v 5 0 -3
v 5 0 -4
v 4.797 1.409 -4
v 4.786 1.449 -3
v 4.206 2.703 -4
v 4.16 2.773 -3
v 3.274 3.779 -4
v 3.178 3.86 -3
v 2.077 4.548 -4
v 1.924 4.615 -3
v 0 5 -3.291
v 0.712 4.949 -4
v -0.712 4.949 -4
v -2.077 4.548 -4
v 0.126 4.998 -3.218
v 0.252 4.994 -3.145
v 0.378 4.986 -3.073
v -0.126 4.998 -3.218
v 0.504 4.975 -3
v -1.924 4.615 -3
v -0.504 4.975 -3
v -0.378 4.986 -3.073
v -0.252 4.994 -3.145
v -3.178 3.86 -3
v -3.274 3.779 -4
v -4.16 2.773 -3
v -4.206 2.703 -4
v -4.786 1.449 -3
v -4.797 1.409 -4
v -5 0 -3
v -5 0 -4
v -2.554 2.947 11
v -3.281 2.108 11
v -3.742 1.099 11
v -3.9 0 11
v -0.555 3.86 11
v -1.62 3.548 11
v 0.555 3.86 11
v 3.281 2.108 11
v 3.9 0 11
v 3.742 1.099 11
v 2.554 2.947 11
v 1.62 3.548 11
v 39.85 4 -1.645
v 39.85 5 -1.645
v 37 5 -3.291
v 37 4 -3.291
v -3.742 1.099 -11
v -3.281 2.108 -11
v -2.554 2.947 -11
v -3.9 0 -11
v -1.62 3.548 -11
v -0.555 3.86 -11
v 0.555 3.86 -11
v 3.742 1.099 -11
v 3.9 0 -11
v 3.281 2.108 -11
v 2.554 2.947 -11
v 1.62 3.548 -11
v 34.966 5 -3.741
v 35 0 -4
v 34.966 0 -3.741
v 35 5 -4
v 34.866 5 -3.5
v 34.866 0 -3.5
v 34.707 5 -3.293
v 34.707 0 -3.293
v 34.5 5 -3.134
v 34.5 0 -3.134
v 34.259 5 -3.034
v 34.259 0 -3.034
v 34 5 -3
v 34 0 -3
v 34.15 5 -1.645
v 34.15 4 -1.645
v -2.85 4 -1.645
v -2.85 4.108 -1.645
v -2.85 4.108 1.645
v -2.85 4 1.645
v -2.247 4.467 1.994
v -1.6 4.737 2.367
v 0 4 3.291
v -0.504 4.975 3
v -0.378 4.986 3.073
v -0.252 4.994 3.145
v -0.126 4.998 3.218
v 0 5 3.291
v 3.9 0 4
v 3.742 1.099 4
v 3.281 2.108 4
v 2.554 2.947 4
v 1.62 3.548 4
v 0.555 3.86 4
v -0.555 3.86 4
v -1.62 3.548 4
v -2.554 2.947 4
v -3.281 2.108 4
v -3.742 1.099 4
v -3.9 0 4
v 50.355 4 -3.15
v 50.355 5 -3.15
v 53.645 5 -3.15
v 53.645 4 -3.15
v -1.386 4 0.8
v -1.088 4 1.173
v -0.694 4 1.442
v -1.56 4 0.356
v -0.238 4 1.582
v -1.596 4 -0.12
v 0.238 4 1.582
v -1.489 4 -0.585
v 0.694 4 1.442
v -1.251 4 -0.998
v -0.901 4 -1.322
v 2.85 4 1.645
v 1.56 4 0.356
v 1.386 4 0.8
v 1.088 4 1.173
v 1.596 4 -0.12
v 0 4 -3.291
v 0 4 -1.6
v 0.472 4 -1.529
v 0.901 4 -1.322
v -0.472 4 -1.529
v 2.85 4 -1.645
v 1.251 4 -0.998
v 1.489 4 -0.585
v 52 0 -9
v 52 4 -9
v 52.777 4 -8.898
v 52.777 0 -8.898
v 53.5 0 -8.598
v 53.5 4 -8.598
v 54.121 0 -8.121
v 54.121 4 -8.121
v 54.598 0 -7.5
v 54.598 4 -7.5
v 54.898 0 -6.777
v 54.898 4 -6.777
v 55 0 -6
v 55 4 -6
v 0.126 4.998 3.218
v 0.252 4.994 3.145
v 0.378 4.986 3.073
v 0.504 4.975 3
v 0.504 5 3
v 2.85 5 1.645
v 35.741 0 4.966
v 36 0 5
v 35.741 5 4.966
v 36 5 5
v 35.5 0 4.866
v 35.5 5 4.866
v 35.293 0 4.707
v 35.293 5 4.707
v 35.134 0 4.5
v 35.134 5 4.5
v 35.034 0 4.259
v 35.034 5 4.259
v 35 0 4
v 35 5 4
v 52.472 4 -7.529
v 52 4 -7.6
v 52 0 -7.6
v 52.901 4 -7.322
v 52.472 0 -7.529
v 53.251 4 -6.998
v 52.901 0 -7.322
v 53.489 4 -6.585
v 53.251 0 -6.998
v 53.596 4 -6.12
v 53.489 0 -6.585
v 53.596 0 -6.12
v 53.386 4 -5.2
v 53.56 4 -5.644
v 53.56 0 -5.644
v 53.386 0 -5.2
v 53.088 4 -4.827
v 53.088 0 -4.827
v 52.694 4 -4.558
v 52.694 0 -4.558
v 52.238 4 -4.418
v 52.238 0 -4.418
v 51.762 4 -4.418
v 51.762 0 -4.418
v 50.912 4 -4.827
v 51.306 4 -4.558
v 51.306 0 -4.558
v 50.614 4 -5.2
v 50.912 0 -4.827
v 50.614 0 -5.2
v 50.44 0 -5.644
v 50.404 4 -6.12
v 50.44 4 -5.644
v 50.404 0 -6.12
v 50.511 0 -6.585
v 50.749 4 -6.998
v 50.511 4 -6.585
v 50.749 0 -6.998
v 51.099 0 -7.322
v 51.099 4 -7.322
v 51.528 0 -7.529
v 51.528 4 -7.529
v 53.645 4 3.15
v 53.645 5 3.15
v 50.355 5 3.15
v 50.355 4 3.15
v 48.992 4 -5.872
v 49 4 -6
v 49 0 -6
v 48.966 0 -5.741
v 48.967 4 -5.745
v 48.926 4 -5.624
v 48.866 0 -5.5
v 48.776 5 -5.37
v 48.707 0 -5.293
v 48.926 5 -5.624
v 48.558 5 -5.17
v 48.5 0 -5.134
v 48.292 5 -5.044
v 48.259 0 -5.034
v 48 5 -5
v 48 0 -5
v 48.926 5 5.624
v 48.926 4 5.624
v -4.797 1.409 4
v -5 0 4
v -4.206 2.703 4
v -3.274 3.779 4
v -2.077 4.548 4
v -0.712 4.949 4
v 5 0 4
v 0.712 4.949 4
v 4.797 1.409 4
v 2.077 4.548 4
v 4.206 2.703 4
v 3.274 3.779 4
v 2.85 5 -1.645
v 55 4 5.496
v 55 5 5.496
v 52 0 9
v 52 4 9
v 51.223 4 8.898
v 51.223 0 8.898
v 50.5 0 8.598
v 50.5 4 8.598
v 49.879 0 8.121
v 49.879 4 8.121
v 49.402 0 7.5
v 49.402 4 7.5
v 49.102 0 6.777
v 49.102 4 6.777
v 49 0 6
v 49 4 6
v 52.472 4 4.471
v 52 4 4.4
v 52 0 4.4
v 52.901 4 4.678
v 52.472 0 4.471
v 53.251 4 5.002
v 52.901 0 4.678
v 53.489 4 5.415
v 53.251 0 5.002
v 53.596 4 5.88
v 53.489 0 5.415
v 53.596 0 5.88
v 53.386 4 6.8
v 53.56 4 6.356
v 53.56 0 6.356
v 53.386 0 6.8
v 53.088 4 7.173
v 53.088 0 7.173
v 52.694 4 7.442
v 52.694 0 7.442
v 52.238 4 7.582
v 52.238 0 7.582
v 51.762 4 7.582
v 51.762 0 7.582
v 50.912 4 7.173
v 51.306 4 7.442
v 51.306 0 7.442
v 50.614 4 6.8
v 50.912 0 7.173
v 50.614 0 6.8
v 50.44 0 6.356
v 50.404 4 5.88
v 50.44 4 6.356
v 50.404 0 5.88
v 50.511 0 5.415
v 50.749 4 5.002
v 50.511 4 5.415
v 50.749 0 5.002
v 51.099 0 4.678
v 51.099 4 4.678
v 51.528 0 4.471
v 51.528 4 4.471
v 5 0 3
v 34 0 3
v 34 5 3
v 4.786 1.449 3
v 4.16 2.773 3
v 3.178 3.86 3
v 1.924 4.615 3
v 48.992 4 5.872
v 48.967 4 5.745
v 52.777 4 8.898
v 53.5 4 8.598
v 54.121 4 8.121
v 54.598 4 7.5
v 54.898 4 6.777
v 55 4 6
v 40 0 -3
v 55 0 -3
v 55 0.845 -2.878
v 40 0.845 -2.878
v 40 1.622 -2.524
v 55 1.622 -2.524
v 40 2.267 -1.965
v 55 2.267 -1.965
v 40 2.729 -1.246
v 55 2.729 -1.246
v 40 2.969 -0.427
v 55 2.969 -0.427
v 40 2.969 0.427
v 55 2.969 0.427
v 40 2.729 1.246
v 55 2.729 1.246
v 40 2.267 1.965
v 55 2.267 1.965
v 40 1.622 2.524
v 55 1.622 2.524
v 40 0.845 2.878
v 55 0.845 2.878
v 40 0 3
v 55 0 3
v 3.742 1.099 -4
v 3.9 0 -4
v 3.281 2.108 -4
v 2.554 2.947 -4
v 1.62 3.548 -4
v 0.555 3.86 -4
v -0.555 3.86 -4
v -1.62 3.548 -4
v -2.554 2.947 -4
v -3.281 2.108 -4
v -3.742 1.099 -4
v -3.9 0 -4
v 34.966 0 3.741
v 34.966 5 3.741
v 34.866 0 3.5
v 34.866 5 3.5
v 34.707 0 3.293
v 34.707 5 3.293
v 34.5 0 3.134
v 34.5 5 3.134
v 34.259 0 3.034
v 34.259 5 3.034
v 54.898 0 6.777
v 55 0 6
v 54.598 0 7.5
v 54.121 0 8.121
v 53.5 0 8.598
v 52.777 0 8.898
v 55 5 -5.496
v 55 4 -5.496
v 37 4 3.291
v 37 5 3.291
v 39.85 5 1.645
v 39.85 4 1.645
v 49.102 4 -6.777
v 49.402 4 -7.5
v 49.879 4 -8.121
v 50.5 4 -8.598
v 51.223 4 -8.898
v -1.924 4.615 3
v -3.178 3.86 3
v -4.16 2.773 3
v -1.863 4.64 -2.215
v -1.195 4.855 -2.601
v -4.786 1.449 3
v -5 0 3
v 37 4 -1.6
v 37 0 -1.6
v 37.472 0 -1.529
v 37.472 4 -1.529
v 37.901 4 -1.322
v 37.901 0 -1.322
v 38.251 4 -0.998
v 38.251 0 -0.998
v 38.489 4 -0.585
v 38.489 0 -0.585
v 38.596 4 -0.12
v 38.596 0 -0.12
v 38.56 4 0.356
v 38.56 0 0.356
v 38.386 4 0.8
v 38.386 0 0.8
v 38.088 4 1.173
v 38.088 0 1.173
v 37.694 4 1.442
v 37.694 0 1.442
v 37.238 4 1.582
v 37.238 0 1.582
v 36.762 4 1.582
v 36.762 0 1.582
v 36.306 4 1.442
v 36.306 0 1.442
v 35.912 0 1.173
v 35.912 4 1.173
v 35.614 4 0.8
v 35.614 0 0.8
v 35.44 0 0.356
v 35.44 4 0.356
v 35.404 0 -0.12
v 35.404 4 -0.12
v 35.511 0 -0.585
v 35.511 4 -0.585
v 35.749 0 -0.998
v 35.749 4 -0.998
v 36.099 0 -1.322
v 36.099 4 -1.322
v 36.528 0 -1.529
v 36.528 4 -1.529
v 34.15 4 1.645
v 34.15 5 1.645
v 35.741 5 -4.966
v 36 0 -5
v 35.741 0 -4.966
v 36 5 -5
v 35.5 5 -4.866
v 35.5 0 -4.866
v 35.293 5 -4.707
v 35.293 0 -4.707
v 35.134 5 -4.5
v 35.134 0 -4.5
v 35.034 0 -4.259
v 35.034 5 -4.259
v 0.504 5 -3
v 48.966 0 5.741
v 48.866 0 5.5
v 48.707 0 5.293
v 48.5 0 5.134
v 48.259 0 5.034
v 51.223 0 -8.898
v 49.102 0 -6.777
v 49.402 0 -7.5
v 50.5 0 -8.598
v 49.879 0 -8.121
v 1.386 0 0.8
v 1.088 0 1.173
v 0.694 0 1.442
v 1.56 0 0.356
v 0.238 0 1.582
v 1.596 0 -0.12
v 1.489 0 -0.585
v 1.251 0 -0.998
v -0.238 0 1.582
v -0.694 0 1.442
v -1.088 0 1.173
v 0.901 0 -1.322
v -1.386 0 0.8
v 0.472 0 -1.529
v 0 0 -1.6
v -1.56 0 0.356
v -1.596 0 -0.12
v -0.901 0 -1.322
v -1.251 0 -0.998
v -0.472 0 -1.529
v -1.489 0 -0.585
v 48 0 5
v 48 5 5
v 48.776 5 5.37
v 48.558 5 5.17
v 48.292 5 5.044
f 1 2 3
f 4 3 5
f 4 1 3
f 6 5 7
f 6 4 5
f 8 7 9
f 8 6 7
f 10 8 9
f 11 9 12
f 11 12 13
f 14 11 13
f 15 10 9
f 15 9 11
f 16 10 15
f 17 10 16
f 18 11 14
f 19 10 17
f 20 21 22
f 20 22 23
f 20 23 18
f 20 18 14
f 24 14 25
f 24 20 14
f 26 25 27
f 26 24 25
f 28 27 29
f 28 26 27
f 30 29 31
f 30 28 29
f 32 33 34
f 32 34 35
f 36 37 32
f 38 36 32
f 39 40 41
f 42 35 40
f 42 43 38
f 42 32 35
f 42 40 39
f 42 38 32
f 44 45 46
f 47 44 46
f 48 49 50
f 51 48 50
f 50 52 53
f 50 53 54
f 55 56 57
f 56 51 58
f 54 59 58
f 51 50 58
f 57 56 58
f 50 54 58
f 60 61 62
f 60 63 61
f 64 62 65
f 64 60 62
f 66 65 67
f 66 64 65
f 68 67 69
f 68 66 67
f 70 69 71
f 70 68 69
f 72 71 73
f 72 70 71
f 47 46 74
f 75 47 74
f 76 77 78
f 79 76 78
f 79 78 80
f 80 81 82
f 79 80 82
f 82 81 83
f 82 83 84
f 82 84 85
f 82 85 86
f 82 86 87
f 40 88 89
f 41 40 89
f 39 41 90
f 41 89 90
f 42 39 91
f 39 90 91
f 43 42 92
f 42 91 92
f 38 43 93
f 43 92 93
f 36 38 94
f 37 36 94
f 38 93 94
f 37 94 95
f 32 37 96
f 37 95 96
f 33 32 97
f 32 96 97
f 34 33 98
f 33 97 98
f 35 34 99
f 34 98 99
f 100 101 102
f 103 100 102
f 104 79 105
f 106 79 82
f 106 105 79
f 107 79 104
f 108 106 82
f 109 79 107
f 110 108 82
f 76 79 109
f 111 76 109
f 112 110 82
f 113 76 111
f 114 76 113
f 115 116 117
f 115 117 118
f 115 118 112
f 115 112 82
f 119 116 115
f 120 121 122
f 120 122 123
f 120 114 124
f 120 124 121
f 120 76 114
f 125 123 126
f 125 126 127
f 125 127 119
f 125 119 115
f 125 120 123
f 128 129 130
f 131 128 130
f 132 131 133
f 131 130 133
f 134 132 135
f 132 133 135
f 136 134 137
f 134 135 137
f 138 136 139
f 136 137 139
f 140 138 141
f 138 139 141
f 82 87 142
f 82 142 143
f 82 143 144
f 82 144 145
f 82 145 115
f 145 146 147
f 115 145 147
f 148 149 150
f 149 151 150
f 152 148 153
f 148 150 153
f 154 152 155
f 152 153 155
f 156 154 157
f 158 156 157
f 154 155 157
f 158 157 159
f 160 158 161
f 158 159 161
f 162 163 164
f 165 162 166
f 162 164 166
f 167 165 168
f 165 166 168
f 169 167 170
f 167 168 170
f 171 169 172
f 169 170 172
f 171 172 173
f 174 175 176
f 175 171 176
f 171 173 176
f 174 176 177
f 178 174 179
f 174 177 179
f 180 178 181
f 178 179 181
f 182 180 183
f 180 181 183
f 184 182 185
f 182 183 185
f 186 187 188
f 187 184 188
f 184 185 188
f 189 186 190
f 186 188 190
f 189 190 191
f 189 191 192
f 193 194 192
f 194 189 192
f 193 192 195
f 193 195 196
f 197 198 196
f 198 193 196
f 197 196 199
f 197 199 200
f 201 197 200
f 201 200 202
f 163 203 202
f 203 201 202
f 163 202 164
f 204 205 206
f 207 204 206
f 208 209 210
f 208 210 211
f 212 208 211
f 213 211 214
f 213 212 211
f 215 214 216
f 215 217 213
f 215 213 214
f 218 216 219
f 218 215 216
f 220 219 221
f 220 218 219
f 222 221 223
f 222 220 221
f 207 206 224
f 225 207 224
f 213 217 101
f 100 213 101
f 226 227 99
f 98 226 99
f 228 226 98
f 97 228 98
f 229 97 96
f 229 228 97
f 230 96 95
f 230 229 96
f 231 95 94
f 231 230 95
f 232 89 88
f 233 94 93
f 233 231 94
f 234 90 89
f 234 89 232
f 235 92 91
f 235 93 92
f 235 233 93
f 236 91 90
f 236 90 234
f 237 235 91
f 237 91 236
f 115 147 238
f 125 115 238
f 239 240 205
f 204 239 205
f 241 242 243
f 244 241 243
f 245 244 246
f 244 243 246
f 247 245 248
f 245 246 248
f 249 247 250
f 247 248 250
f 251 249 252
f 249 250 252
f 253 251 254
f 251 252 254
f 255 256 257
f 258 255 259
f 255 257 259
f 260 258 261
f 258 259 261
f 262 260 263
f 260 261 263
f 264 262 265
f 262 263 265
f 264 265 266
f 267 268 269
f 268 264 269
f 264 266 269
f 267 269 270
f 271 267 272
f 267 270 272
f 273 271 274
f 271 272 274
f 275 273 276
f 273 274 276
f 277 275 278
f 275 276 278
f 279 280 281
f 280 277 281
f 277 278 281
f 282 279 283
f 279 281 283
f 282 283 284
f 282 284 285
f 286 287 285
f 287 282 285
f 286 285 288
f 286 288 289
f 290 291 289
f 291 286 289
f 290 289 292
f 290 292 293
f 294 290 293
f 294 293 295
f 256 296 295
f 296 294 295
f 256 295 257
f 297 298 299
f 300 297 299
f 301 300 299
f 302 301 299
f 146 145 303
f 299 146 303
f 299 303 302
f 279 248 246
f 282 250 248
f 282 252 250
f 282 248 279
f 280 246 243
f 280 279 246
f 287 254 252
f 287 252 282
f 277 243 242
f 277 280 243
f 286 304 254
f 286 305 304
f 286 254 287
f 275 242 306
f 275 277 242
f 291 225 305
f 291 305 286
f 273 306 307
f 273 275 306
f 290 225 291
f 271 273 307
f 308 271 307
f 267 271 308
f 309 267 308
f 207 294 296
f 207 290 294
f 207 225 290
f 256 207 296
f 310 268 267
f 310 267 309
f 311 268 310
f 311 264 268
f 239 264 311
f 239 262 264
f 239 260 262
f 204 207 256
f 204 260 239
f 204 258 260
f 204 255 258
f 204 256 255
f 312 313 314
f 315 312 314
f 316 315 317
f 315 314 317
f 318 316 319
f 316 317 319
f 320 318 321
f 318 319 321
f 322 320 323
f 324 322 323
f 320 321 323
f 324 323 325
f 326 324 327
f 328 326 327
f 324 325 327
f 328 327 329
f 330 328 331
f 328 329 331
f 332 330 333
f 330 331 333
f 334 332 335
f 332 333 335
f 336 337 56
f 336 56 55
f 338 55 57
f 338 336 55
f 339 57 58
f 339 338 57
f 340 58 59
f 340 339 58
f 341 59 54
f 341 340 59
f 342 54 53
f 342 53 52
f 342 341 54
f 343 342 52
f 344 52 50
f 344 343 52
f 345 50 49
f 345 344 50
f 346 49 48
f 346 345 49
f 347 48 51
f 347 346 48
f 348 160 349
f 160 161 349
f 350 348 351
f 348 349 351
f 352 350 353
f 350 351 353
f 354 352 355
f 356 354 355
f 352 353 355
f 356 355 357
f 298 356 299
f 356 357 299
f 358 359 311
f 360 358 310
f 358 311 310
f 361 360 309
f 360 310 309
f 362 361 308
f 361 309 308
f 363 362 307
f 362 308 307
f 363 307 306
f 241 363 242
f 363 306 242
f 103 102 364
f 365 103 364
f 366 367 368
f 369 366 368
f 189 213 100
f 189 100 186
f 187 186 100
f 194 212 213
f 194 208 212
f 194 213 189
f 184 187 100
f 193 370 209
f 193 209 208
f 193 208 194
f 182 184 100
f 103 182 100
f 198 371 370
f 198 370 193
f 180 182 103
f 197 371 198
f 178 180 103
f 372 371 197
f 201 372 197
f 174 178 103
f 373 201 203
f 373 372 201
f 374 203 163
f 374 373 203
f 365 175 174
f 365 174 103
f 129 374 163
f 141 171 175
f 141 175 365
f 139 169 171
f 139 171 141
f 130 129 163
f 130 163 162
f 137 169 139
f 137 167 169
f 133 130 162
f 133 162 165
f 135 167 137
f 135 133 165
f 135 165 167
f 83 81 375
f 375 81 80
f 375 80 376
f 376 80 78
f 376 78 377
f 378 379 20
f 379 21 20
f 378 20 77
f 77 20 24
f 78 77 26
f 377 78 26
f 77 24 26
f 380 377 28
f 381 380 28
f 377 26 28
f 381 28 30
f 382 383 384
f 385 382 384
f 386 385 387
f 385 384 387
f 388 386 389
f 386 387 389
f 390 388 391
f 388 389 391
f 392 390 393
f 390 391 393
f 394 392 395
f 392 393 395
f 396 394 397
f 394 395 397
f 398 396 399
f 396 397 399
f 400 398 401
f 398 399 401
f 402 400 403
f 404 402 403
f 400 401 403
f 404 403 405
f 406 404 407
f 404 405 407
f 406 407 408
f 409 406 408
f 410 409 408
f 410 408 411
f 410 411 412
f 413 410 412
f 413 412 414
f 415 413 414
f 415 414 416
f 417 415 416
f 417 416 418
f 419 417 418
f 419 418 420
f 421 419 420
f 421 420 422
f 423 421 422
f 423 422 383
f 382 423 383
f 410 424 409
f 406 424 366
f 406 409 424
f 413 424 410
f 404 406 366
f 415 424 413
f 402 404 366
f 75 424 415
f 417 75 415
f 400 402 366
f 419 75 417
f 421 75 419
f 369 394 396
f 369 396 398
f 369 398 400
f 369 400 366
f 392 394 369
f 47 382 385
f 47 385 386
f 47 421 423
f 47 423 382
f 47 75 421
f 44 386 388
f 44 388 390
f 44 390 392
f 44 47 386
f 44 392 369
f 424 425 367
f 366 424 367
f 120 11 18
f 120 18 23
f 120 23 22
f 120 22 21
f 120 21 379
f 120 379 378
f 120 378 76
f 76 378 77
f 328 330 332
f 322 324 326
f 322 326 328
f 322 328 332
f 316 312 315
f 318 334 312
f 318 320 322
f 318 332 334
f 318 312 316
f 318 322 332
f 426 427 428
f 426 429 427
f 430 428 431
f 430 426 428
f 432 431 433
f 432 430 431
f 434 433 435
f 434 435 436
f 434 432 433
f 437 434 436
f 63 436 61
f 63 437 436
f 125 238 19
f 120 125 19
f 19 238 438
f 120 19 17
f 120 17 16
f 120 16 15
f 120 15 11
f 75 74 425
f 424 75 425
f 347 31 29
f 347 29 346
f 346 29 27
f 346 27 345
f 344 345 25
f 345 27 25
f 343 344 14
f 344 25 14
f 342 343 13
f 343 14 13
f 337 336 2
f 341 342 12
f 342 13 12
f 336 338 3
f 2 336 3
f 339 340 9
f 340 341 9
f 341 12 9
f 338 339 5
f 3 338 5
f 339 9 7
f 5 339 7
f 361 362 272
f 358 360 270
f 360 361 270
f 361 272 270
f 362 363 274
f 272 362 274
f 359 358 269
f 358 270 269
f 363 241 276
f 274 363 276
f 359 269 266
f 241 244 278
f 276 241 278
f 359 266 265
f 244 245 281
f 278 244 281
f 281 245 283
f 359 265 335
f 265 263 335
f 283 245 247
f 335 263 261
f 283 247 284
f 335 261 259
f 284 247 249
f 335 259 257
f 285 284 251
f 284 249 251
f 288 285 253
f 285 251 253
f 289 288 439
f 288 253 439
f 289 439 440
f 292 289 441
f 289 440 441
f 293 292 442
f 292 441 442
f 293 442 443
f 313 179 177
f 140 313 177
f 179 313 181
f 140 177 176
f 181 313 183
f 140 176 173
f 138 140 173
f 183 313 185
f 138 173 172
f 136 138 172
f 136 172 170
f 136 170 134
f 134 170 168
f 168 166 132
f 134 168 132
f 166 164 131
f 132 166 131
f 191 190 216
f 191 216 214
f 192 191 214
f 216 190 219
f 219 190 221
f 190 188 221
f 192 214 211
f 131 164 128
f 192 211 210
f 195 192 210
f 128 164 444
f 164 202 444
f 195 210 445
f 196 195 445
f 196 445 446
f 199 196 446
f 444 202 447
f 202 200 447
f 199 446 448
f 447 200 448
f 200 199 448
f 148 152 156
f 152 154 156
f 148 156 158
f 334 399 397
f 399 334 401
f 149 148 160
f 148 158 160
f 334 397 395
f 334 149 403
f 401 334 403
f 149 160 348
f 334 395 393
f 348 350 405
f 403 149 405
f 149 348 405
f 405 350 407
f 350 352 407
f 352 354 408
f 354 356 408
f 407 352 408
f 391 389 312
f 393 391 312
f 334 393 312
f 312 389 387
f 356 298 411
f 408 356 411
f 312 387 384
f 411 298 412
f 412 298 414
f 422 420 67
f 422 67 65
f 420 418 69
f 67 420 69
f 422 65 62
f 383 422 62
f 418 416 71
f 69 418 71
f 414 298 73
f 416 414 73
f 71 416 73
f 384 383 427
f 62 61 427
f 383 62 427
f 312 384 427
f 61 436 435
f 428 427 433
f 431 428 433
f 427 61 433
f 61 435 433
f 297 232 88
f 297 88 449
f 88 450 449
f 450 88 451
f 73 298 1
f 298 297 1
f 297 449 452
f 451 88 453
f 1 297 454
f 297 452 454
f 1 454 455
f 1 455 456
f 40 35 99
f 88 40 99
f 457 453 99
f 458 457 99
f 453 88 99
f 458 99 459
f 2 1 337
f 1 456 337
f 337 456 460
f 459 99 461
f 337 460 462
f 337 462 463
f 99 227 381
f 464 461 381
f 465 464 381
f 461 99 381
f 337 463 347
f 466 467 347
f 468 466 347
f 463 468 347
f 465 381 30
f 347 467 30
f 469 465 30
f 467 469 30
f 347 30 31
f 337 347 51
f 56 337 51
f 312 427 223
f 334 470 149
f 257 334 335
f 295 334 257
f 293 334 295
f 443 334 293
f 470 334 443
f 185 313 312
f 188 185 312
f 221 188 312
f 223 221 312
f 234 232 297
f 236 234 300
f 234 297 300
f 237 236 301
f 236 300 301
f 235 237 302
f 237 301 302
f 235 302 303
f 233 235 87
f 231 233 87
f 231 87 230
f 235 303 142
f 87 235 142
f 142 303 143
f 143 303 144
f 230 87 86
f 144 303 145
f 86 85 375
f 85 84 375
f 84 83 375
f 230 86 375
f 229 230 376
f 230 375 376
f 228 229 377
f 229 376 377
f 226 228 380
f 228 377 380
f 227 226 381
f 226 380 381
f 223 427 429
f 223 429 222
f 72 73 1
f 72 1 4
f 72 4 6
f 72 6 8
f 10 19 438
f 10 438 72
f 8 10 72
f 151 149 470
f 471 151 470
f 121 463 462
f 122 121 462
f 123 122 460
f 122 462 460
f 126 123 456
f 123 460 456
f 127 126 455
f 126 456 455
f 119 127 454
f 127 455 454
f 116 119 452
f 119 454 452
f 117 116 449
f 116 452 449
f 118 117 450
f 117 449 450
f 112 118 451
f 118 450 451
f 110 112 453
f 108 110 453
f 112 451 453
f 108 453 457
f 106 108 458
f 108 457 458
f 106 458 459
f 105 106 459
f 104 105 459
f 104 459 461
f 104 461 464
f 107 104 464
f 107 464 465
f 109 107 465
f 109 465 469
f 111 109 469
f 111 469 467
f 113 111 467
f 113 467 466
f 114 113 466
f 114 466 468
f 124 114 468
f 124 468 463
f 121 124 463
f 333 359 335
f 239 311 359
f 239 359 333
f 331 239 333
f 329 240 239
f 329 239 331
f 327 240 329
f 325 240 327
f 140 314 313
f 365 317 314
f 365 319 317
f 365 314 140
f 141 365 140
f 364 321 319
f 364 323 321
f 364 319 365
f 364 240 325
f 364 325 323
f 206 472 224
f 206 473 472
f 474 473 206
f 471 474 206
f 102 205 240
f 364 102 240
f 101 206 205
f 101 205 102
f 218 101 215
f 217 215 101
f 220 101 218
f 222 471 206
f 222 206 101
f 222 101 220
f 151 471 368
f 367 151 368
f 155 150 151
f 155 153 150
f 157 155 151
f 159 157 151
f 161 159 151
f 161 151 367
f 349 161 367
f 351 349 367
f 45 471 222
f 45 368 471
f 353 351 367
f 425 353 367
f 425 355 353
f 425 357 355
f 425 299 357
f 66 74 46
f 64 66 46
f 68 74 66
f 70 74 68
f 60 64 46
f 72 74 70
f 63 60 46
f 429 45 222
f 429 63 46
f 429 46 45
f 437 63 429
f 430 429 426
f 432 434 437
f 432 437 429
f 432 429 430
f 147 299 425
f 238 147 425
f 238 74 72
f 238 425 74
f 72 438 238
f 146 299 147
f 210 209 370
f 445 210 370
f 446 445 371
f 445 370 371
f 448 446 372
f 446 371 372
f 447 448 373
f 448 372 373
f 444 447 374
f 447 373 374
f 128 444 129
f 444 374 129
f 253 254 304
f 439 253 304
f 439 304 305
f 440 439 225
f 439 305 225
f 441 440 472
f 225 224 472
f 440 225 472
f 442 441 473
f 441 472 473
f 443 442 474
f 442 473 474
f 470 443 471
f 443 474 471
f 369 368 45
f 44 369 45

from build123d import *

# Parameters (mm, degrees)
SKETCH1_W           = 10
SKETCH1_H           = 6
BOSS_EXTRUDE1_DEPTH = 5
BOSS_EXTRUDE3_DEPTH = 1
BOSS_EXTRUDE4_DEPTH = 7
SKETCH4_W           = 6
SKETCH4_H           = 5
BOSS_EXTRUDE5_DEPTH = 30
SKETCH5_W           = 14
SKETCH5_H           = 10
BOSS_EXTRUDE6_DEPTH = 5
FILLET17_R          = 5
SKETCH8_W           = 18
SKETCH8_H           = 5
BOSS_EXTRUDE7_DEPTH = 6
FILLET8_R           = 1
CUT_EXTRUDE3_DEPTH  = 15
SKETCH10_R          = 1.6
CUT_EXTRUDE4_DEPTH  = 57.311632901
FILLET11_R          = 3
CUT_EXTRUDE9_DEPTH  = 1
SKETCH14_W          = 6
SKETCH14_H          = 5
CUT_EXTRUDE10_DEPTH = 1


with BuildPart() as part:
    # Sketch1 → Boss-Extrude1 (new body)
    with BuildSketch(Plane(origin=(0, 0, 0), x_dir=(1, 0, 0), z_dir=(0, 1, 0))):
        Rectangle(SKETCH1_W, SKETCH1_H)
    extrude(amount=BOSS_EXTRUDE1_DEPTH)

    # Sketch2 → Boss-Extrude3 (add)
    with BuildSketch(Plane.XY.offset(3)):
        with BuildLine():
            Line((-5, 0), (5, 0))
            ThreePointArc((5, 0), (0, 5), (-5, 0))
        make_face()
    boss_extrude3 = extrude(amount=BOSS_EXTRUDE3_DEPTH)

    # Sketch3 → Boss-Extrude4 (add)
    with BuildSketch(Plane.XY.offset(4)):
        with BuildLine():
            Line((-3.9, 0), (3.9, 0))
            ThreePointArc((3.9, 0), (0, 3.9), (-3.9, 0))
        make_face()
    boss_extrude4 = extrude(amount=BOSS_EXTRUDE4_DEPTH)

    # Mirror1: Boss-Extrude3, Boss-Extrude4 across plane
    add(boss_extrude3.mirror(Plane.XY))
    add(boss_extrude4.mirror(Plane.XY))

    # Sketch4 → Boss-Extrude5 (add)
    with BuildSketch(Plane(origin=(5, 0, 0), x_dir=(0, 0, -1), z_dir=(1, 0, 0))):
        with Locations((0, 2.5)):
            Rectangle(SKETCH4_W, SKETCH4_H)
    extrude(amount=BOSS_EXTRUDE5_DEPTH)

    # Sketch5 → Boss-Extrude6 (add)
    with BuildSketch(Plane(origin=(0, 0, 0), x_dir=(1, 0, 0), z_dir=(0, 1, 0))):
        with Locations((42, 0)):
            Rectangle(SKETCH5_W, SKETCH5_H)
    extrude(amount=BOSS_EXTRUDE6_DEPTH)

    # Fillet17
    fillet17_edges = [part.edges().sort_by_distance(p)[0] for p in [
        (-5, 5, 0),
    ]]
    fillet(fillet17_edges, radius=FILLET17_R - 0.0001)  # a hair under: the kernel refuses the full size

    # Sketch8 → Boss-Extrude7 (add)
    with BuildSketch(Plane(origin=(49, 0, 0), x_dir=(0, 0, -1), z_dir=(1, 0, 0))):
        with Locations((0, 2.5)):
            Rectangle(SKETCH8_W, SKETCH8_H)
    extrude(amount=BOSS_EXTRUDE7_DEPTH)

    # Fillet8
    fillet8_edges = [part.edges().sort_by_distance(p)[0] for p in [
        (49, 2.5, 5),
        (35, 2.5, 5),
        (35, 2.5, 3),
        (35, 2.5, -3),
        (35, 2.5, -5),
        (49, 2.5, -5),
    ]]
    fillet(fillet8_edges, radius=FILLET8_R - 0.0001)  # a hair under: the kernel refuses the full size

    # Sketch9 → Cut-Extrude3 (cut)
    with BuildSketch(Plane(origin=(55, 0, 0), x_dir=(0, 0, -1), z_dir=(1, 0, 0))):
        with BuildLine():
            Line((-3, 0), (3, 0))
            ThreePointArc((3, 0), (0, 3), (-3, 0))
        make_face()
    extrude(amount=-CUT_EXTRUDE3_DEPTH, mode=Mode.SUBTRACT)

    # Sketch10 → Cut-Extrude4 (cut, through all)
    with BuildSketch(Plane.XZ):
        with Locations(Location((52, 6, 0), (0, 0, 270))):
            Circle(SKETCH10_R)
        with Locations(Location((52, -6, 0), (0, 0, 270))):
            Circle(SKETCH10_R)
        with Locations(Location((37, 0, 0), (0, 0, 270))):
            Circle(SKETCH10_R)
        with Locations(Location((0, 0, 0), (0, 0, 270))):
            Circle(SKETCH10_R)
    extrude(amount=-CUT_EXTRUDE4_DEPTH, mode=Mode.SUBTRACT)

    # Fillet11
    fillet11_edges = [part.edges().sort_by_distance(p)[0] for p in [
        (49, 2.5, -9),
        (55, 2.5, -9),
        (49, 2.5, 9),
        (55, 2.5, 9),
    ]]
    fillet(fillet11_edges, radius=FILLET11_R - 0.0001)  # a hair under: the kernel refuses the full size

    # Sketch13 → Cut-Extrude9 (cut)
    with BuildSketch(Plane(origin=(0, 5, 0), x_dir=(1, 0, 0), z_dir=(0, 1, 0))):
        Polygon((55.290896534, -6), (53.645448267, -3.15), (50.354551733, -3.15), (48.709103466, -6), (50.354551733, -8.85), (53.645448267, -8.85), align=None)
        Polygon((55.290896534, 6), (53.645448267, 8.85), (50.354551733, 8.85), (48.709103466, 6), (50.354551733, 3.15), (53.645448267, 3.15), align=None)
        Polygon((39.85, -1.645448267), (39.85, 1.645448267), (37, 3.290896534), (34.15, 1.645448267), (34.15, -1.645448267), (37, -3.290896534), align=None)
        Polygon((0, -3.290896534), (2.85, -1.645448267), (2.85, 1.645448267), (0, 3.290896534), (-2.85, 1.645448267), (-2.85, -1.645448267), align=None)
    extrude(amount=-CUT_EXTRUDE9_DEPTH, mode=Mode.SUBTRACT)

    # Sketch14 → Cut-Extrude10 (cut)
    with BuildSketch(Plane(origin=(0, 5, 0), x_dir=(1, 0, 0), z_dir=(0, 1, 0))):
        with Locations((52, -7.996152423)):
            Rectangle(SKETCH14_W, SKETCH14_H)
        with Locations((52, 7.996152423)):
            Rectangle(SKETCH14_W, SKETCH14_H)
    extrude(amount=-CUT_EXTRUDE10_DEPTH, mode=Mode.SUBTRACT)


solid = part.part
